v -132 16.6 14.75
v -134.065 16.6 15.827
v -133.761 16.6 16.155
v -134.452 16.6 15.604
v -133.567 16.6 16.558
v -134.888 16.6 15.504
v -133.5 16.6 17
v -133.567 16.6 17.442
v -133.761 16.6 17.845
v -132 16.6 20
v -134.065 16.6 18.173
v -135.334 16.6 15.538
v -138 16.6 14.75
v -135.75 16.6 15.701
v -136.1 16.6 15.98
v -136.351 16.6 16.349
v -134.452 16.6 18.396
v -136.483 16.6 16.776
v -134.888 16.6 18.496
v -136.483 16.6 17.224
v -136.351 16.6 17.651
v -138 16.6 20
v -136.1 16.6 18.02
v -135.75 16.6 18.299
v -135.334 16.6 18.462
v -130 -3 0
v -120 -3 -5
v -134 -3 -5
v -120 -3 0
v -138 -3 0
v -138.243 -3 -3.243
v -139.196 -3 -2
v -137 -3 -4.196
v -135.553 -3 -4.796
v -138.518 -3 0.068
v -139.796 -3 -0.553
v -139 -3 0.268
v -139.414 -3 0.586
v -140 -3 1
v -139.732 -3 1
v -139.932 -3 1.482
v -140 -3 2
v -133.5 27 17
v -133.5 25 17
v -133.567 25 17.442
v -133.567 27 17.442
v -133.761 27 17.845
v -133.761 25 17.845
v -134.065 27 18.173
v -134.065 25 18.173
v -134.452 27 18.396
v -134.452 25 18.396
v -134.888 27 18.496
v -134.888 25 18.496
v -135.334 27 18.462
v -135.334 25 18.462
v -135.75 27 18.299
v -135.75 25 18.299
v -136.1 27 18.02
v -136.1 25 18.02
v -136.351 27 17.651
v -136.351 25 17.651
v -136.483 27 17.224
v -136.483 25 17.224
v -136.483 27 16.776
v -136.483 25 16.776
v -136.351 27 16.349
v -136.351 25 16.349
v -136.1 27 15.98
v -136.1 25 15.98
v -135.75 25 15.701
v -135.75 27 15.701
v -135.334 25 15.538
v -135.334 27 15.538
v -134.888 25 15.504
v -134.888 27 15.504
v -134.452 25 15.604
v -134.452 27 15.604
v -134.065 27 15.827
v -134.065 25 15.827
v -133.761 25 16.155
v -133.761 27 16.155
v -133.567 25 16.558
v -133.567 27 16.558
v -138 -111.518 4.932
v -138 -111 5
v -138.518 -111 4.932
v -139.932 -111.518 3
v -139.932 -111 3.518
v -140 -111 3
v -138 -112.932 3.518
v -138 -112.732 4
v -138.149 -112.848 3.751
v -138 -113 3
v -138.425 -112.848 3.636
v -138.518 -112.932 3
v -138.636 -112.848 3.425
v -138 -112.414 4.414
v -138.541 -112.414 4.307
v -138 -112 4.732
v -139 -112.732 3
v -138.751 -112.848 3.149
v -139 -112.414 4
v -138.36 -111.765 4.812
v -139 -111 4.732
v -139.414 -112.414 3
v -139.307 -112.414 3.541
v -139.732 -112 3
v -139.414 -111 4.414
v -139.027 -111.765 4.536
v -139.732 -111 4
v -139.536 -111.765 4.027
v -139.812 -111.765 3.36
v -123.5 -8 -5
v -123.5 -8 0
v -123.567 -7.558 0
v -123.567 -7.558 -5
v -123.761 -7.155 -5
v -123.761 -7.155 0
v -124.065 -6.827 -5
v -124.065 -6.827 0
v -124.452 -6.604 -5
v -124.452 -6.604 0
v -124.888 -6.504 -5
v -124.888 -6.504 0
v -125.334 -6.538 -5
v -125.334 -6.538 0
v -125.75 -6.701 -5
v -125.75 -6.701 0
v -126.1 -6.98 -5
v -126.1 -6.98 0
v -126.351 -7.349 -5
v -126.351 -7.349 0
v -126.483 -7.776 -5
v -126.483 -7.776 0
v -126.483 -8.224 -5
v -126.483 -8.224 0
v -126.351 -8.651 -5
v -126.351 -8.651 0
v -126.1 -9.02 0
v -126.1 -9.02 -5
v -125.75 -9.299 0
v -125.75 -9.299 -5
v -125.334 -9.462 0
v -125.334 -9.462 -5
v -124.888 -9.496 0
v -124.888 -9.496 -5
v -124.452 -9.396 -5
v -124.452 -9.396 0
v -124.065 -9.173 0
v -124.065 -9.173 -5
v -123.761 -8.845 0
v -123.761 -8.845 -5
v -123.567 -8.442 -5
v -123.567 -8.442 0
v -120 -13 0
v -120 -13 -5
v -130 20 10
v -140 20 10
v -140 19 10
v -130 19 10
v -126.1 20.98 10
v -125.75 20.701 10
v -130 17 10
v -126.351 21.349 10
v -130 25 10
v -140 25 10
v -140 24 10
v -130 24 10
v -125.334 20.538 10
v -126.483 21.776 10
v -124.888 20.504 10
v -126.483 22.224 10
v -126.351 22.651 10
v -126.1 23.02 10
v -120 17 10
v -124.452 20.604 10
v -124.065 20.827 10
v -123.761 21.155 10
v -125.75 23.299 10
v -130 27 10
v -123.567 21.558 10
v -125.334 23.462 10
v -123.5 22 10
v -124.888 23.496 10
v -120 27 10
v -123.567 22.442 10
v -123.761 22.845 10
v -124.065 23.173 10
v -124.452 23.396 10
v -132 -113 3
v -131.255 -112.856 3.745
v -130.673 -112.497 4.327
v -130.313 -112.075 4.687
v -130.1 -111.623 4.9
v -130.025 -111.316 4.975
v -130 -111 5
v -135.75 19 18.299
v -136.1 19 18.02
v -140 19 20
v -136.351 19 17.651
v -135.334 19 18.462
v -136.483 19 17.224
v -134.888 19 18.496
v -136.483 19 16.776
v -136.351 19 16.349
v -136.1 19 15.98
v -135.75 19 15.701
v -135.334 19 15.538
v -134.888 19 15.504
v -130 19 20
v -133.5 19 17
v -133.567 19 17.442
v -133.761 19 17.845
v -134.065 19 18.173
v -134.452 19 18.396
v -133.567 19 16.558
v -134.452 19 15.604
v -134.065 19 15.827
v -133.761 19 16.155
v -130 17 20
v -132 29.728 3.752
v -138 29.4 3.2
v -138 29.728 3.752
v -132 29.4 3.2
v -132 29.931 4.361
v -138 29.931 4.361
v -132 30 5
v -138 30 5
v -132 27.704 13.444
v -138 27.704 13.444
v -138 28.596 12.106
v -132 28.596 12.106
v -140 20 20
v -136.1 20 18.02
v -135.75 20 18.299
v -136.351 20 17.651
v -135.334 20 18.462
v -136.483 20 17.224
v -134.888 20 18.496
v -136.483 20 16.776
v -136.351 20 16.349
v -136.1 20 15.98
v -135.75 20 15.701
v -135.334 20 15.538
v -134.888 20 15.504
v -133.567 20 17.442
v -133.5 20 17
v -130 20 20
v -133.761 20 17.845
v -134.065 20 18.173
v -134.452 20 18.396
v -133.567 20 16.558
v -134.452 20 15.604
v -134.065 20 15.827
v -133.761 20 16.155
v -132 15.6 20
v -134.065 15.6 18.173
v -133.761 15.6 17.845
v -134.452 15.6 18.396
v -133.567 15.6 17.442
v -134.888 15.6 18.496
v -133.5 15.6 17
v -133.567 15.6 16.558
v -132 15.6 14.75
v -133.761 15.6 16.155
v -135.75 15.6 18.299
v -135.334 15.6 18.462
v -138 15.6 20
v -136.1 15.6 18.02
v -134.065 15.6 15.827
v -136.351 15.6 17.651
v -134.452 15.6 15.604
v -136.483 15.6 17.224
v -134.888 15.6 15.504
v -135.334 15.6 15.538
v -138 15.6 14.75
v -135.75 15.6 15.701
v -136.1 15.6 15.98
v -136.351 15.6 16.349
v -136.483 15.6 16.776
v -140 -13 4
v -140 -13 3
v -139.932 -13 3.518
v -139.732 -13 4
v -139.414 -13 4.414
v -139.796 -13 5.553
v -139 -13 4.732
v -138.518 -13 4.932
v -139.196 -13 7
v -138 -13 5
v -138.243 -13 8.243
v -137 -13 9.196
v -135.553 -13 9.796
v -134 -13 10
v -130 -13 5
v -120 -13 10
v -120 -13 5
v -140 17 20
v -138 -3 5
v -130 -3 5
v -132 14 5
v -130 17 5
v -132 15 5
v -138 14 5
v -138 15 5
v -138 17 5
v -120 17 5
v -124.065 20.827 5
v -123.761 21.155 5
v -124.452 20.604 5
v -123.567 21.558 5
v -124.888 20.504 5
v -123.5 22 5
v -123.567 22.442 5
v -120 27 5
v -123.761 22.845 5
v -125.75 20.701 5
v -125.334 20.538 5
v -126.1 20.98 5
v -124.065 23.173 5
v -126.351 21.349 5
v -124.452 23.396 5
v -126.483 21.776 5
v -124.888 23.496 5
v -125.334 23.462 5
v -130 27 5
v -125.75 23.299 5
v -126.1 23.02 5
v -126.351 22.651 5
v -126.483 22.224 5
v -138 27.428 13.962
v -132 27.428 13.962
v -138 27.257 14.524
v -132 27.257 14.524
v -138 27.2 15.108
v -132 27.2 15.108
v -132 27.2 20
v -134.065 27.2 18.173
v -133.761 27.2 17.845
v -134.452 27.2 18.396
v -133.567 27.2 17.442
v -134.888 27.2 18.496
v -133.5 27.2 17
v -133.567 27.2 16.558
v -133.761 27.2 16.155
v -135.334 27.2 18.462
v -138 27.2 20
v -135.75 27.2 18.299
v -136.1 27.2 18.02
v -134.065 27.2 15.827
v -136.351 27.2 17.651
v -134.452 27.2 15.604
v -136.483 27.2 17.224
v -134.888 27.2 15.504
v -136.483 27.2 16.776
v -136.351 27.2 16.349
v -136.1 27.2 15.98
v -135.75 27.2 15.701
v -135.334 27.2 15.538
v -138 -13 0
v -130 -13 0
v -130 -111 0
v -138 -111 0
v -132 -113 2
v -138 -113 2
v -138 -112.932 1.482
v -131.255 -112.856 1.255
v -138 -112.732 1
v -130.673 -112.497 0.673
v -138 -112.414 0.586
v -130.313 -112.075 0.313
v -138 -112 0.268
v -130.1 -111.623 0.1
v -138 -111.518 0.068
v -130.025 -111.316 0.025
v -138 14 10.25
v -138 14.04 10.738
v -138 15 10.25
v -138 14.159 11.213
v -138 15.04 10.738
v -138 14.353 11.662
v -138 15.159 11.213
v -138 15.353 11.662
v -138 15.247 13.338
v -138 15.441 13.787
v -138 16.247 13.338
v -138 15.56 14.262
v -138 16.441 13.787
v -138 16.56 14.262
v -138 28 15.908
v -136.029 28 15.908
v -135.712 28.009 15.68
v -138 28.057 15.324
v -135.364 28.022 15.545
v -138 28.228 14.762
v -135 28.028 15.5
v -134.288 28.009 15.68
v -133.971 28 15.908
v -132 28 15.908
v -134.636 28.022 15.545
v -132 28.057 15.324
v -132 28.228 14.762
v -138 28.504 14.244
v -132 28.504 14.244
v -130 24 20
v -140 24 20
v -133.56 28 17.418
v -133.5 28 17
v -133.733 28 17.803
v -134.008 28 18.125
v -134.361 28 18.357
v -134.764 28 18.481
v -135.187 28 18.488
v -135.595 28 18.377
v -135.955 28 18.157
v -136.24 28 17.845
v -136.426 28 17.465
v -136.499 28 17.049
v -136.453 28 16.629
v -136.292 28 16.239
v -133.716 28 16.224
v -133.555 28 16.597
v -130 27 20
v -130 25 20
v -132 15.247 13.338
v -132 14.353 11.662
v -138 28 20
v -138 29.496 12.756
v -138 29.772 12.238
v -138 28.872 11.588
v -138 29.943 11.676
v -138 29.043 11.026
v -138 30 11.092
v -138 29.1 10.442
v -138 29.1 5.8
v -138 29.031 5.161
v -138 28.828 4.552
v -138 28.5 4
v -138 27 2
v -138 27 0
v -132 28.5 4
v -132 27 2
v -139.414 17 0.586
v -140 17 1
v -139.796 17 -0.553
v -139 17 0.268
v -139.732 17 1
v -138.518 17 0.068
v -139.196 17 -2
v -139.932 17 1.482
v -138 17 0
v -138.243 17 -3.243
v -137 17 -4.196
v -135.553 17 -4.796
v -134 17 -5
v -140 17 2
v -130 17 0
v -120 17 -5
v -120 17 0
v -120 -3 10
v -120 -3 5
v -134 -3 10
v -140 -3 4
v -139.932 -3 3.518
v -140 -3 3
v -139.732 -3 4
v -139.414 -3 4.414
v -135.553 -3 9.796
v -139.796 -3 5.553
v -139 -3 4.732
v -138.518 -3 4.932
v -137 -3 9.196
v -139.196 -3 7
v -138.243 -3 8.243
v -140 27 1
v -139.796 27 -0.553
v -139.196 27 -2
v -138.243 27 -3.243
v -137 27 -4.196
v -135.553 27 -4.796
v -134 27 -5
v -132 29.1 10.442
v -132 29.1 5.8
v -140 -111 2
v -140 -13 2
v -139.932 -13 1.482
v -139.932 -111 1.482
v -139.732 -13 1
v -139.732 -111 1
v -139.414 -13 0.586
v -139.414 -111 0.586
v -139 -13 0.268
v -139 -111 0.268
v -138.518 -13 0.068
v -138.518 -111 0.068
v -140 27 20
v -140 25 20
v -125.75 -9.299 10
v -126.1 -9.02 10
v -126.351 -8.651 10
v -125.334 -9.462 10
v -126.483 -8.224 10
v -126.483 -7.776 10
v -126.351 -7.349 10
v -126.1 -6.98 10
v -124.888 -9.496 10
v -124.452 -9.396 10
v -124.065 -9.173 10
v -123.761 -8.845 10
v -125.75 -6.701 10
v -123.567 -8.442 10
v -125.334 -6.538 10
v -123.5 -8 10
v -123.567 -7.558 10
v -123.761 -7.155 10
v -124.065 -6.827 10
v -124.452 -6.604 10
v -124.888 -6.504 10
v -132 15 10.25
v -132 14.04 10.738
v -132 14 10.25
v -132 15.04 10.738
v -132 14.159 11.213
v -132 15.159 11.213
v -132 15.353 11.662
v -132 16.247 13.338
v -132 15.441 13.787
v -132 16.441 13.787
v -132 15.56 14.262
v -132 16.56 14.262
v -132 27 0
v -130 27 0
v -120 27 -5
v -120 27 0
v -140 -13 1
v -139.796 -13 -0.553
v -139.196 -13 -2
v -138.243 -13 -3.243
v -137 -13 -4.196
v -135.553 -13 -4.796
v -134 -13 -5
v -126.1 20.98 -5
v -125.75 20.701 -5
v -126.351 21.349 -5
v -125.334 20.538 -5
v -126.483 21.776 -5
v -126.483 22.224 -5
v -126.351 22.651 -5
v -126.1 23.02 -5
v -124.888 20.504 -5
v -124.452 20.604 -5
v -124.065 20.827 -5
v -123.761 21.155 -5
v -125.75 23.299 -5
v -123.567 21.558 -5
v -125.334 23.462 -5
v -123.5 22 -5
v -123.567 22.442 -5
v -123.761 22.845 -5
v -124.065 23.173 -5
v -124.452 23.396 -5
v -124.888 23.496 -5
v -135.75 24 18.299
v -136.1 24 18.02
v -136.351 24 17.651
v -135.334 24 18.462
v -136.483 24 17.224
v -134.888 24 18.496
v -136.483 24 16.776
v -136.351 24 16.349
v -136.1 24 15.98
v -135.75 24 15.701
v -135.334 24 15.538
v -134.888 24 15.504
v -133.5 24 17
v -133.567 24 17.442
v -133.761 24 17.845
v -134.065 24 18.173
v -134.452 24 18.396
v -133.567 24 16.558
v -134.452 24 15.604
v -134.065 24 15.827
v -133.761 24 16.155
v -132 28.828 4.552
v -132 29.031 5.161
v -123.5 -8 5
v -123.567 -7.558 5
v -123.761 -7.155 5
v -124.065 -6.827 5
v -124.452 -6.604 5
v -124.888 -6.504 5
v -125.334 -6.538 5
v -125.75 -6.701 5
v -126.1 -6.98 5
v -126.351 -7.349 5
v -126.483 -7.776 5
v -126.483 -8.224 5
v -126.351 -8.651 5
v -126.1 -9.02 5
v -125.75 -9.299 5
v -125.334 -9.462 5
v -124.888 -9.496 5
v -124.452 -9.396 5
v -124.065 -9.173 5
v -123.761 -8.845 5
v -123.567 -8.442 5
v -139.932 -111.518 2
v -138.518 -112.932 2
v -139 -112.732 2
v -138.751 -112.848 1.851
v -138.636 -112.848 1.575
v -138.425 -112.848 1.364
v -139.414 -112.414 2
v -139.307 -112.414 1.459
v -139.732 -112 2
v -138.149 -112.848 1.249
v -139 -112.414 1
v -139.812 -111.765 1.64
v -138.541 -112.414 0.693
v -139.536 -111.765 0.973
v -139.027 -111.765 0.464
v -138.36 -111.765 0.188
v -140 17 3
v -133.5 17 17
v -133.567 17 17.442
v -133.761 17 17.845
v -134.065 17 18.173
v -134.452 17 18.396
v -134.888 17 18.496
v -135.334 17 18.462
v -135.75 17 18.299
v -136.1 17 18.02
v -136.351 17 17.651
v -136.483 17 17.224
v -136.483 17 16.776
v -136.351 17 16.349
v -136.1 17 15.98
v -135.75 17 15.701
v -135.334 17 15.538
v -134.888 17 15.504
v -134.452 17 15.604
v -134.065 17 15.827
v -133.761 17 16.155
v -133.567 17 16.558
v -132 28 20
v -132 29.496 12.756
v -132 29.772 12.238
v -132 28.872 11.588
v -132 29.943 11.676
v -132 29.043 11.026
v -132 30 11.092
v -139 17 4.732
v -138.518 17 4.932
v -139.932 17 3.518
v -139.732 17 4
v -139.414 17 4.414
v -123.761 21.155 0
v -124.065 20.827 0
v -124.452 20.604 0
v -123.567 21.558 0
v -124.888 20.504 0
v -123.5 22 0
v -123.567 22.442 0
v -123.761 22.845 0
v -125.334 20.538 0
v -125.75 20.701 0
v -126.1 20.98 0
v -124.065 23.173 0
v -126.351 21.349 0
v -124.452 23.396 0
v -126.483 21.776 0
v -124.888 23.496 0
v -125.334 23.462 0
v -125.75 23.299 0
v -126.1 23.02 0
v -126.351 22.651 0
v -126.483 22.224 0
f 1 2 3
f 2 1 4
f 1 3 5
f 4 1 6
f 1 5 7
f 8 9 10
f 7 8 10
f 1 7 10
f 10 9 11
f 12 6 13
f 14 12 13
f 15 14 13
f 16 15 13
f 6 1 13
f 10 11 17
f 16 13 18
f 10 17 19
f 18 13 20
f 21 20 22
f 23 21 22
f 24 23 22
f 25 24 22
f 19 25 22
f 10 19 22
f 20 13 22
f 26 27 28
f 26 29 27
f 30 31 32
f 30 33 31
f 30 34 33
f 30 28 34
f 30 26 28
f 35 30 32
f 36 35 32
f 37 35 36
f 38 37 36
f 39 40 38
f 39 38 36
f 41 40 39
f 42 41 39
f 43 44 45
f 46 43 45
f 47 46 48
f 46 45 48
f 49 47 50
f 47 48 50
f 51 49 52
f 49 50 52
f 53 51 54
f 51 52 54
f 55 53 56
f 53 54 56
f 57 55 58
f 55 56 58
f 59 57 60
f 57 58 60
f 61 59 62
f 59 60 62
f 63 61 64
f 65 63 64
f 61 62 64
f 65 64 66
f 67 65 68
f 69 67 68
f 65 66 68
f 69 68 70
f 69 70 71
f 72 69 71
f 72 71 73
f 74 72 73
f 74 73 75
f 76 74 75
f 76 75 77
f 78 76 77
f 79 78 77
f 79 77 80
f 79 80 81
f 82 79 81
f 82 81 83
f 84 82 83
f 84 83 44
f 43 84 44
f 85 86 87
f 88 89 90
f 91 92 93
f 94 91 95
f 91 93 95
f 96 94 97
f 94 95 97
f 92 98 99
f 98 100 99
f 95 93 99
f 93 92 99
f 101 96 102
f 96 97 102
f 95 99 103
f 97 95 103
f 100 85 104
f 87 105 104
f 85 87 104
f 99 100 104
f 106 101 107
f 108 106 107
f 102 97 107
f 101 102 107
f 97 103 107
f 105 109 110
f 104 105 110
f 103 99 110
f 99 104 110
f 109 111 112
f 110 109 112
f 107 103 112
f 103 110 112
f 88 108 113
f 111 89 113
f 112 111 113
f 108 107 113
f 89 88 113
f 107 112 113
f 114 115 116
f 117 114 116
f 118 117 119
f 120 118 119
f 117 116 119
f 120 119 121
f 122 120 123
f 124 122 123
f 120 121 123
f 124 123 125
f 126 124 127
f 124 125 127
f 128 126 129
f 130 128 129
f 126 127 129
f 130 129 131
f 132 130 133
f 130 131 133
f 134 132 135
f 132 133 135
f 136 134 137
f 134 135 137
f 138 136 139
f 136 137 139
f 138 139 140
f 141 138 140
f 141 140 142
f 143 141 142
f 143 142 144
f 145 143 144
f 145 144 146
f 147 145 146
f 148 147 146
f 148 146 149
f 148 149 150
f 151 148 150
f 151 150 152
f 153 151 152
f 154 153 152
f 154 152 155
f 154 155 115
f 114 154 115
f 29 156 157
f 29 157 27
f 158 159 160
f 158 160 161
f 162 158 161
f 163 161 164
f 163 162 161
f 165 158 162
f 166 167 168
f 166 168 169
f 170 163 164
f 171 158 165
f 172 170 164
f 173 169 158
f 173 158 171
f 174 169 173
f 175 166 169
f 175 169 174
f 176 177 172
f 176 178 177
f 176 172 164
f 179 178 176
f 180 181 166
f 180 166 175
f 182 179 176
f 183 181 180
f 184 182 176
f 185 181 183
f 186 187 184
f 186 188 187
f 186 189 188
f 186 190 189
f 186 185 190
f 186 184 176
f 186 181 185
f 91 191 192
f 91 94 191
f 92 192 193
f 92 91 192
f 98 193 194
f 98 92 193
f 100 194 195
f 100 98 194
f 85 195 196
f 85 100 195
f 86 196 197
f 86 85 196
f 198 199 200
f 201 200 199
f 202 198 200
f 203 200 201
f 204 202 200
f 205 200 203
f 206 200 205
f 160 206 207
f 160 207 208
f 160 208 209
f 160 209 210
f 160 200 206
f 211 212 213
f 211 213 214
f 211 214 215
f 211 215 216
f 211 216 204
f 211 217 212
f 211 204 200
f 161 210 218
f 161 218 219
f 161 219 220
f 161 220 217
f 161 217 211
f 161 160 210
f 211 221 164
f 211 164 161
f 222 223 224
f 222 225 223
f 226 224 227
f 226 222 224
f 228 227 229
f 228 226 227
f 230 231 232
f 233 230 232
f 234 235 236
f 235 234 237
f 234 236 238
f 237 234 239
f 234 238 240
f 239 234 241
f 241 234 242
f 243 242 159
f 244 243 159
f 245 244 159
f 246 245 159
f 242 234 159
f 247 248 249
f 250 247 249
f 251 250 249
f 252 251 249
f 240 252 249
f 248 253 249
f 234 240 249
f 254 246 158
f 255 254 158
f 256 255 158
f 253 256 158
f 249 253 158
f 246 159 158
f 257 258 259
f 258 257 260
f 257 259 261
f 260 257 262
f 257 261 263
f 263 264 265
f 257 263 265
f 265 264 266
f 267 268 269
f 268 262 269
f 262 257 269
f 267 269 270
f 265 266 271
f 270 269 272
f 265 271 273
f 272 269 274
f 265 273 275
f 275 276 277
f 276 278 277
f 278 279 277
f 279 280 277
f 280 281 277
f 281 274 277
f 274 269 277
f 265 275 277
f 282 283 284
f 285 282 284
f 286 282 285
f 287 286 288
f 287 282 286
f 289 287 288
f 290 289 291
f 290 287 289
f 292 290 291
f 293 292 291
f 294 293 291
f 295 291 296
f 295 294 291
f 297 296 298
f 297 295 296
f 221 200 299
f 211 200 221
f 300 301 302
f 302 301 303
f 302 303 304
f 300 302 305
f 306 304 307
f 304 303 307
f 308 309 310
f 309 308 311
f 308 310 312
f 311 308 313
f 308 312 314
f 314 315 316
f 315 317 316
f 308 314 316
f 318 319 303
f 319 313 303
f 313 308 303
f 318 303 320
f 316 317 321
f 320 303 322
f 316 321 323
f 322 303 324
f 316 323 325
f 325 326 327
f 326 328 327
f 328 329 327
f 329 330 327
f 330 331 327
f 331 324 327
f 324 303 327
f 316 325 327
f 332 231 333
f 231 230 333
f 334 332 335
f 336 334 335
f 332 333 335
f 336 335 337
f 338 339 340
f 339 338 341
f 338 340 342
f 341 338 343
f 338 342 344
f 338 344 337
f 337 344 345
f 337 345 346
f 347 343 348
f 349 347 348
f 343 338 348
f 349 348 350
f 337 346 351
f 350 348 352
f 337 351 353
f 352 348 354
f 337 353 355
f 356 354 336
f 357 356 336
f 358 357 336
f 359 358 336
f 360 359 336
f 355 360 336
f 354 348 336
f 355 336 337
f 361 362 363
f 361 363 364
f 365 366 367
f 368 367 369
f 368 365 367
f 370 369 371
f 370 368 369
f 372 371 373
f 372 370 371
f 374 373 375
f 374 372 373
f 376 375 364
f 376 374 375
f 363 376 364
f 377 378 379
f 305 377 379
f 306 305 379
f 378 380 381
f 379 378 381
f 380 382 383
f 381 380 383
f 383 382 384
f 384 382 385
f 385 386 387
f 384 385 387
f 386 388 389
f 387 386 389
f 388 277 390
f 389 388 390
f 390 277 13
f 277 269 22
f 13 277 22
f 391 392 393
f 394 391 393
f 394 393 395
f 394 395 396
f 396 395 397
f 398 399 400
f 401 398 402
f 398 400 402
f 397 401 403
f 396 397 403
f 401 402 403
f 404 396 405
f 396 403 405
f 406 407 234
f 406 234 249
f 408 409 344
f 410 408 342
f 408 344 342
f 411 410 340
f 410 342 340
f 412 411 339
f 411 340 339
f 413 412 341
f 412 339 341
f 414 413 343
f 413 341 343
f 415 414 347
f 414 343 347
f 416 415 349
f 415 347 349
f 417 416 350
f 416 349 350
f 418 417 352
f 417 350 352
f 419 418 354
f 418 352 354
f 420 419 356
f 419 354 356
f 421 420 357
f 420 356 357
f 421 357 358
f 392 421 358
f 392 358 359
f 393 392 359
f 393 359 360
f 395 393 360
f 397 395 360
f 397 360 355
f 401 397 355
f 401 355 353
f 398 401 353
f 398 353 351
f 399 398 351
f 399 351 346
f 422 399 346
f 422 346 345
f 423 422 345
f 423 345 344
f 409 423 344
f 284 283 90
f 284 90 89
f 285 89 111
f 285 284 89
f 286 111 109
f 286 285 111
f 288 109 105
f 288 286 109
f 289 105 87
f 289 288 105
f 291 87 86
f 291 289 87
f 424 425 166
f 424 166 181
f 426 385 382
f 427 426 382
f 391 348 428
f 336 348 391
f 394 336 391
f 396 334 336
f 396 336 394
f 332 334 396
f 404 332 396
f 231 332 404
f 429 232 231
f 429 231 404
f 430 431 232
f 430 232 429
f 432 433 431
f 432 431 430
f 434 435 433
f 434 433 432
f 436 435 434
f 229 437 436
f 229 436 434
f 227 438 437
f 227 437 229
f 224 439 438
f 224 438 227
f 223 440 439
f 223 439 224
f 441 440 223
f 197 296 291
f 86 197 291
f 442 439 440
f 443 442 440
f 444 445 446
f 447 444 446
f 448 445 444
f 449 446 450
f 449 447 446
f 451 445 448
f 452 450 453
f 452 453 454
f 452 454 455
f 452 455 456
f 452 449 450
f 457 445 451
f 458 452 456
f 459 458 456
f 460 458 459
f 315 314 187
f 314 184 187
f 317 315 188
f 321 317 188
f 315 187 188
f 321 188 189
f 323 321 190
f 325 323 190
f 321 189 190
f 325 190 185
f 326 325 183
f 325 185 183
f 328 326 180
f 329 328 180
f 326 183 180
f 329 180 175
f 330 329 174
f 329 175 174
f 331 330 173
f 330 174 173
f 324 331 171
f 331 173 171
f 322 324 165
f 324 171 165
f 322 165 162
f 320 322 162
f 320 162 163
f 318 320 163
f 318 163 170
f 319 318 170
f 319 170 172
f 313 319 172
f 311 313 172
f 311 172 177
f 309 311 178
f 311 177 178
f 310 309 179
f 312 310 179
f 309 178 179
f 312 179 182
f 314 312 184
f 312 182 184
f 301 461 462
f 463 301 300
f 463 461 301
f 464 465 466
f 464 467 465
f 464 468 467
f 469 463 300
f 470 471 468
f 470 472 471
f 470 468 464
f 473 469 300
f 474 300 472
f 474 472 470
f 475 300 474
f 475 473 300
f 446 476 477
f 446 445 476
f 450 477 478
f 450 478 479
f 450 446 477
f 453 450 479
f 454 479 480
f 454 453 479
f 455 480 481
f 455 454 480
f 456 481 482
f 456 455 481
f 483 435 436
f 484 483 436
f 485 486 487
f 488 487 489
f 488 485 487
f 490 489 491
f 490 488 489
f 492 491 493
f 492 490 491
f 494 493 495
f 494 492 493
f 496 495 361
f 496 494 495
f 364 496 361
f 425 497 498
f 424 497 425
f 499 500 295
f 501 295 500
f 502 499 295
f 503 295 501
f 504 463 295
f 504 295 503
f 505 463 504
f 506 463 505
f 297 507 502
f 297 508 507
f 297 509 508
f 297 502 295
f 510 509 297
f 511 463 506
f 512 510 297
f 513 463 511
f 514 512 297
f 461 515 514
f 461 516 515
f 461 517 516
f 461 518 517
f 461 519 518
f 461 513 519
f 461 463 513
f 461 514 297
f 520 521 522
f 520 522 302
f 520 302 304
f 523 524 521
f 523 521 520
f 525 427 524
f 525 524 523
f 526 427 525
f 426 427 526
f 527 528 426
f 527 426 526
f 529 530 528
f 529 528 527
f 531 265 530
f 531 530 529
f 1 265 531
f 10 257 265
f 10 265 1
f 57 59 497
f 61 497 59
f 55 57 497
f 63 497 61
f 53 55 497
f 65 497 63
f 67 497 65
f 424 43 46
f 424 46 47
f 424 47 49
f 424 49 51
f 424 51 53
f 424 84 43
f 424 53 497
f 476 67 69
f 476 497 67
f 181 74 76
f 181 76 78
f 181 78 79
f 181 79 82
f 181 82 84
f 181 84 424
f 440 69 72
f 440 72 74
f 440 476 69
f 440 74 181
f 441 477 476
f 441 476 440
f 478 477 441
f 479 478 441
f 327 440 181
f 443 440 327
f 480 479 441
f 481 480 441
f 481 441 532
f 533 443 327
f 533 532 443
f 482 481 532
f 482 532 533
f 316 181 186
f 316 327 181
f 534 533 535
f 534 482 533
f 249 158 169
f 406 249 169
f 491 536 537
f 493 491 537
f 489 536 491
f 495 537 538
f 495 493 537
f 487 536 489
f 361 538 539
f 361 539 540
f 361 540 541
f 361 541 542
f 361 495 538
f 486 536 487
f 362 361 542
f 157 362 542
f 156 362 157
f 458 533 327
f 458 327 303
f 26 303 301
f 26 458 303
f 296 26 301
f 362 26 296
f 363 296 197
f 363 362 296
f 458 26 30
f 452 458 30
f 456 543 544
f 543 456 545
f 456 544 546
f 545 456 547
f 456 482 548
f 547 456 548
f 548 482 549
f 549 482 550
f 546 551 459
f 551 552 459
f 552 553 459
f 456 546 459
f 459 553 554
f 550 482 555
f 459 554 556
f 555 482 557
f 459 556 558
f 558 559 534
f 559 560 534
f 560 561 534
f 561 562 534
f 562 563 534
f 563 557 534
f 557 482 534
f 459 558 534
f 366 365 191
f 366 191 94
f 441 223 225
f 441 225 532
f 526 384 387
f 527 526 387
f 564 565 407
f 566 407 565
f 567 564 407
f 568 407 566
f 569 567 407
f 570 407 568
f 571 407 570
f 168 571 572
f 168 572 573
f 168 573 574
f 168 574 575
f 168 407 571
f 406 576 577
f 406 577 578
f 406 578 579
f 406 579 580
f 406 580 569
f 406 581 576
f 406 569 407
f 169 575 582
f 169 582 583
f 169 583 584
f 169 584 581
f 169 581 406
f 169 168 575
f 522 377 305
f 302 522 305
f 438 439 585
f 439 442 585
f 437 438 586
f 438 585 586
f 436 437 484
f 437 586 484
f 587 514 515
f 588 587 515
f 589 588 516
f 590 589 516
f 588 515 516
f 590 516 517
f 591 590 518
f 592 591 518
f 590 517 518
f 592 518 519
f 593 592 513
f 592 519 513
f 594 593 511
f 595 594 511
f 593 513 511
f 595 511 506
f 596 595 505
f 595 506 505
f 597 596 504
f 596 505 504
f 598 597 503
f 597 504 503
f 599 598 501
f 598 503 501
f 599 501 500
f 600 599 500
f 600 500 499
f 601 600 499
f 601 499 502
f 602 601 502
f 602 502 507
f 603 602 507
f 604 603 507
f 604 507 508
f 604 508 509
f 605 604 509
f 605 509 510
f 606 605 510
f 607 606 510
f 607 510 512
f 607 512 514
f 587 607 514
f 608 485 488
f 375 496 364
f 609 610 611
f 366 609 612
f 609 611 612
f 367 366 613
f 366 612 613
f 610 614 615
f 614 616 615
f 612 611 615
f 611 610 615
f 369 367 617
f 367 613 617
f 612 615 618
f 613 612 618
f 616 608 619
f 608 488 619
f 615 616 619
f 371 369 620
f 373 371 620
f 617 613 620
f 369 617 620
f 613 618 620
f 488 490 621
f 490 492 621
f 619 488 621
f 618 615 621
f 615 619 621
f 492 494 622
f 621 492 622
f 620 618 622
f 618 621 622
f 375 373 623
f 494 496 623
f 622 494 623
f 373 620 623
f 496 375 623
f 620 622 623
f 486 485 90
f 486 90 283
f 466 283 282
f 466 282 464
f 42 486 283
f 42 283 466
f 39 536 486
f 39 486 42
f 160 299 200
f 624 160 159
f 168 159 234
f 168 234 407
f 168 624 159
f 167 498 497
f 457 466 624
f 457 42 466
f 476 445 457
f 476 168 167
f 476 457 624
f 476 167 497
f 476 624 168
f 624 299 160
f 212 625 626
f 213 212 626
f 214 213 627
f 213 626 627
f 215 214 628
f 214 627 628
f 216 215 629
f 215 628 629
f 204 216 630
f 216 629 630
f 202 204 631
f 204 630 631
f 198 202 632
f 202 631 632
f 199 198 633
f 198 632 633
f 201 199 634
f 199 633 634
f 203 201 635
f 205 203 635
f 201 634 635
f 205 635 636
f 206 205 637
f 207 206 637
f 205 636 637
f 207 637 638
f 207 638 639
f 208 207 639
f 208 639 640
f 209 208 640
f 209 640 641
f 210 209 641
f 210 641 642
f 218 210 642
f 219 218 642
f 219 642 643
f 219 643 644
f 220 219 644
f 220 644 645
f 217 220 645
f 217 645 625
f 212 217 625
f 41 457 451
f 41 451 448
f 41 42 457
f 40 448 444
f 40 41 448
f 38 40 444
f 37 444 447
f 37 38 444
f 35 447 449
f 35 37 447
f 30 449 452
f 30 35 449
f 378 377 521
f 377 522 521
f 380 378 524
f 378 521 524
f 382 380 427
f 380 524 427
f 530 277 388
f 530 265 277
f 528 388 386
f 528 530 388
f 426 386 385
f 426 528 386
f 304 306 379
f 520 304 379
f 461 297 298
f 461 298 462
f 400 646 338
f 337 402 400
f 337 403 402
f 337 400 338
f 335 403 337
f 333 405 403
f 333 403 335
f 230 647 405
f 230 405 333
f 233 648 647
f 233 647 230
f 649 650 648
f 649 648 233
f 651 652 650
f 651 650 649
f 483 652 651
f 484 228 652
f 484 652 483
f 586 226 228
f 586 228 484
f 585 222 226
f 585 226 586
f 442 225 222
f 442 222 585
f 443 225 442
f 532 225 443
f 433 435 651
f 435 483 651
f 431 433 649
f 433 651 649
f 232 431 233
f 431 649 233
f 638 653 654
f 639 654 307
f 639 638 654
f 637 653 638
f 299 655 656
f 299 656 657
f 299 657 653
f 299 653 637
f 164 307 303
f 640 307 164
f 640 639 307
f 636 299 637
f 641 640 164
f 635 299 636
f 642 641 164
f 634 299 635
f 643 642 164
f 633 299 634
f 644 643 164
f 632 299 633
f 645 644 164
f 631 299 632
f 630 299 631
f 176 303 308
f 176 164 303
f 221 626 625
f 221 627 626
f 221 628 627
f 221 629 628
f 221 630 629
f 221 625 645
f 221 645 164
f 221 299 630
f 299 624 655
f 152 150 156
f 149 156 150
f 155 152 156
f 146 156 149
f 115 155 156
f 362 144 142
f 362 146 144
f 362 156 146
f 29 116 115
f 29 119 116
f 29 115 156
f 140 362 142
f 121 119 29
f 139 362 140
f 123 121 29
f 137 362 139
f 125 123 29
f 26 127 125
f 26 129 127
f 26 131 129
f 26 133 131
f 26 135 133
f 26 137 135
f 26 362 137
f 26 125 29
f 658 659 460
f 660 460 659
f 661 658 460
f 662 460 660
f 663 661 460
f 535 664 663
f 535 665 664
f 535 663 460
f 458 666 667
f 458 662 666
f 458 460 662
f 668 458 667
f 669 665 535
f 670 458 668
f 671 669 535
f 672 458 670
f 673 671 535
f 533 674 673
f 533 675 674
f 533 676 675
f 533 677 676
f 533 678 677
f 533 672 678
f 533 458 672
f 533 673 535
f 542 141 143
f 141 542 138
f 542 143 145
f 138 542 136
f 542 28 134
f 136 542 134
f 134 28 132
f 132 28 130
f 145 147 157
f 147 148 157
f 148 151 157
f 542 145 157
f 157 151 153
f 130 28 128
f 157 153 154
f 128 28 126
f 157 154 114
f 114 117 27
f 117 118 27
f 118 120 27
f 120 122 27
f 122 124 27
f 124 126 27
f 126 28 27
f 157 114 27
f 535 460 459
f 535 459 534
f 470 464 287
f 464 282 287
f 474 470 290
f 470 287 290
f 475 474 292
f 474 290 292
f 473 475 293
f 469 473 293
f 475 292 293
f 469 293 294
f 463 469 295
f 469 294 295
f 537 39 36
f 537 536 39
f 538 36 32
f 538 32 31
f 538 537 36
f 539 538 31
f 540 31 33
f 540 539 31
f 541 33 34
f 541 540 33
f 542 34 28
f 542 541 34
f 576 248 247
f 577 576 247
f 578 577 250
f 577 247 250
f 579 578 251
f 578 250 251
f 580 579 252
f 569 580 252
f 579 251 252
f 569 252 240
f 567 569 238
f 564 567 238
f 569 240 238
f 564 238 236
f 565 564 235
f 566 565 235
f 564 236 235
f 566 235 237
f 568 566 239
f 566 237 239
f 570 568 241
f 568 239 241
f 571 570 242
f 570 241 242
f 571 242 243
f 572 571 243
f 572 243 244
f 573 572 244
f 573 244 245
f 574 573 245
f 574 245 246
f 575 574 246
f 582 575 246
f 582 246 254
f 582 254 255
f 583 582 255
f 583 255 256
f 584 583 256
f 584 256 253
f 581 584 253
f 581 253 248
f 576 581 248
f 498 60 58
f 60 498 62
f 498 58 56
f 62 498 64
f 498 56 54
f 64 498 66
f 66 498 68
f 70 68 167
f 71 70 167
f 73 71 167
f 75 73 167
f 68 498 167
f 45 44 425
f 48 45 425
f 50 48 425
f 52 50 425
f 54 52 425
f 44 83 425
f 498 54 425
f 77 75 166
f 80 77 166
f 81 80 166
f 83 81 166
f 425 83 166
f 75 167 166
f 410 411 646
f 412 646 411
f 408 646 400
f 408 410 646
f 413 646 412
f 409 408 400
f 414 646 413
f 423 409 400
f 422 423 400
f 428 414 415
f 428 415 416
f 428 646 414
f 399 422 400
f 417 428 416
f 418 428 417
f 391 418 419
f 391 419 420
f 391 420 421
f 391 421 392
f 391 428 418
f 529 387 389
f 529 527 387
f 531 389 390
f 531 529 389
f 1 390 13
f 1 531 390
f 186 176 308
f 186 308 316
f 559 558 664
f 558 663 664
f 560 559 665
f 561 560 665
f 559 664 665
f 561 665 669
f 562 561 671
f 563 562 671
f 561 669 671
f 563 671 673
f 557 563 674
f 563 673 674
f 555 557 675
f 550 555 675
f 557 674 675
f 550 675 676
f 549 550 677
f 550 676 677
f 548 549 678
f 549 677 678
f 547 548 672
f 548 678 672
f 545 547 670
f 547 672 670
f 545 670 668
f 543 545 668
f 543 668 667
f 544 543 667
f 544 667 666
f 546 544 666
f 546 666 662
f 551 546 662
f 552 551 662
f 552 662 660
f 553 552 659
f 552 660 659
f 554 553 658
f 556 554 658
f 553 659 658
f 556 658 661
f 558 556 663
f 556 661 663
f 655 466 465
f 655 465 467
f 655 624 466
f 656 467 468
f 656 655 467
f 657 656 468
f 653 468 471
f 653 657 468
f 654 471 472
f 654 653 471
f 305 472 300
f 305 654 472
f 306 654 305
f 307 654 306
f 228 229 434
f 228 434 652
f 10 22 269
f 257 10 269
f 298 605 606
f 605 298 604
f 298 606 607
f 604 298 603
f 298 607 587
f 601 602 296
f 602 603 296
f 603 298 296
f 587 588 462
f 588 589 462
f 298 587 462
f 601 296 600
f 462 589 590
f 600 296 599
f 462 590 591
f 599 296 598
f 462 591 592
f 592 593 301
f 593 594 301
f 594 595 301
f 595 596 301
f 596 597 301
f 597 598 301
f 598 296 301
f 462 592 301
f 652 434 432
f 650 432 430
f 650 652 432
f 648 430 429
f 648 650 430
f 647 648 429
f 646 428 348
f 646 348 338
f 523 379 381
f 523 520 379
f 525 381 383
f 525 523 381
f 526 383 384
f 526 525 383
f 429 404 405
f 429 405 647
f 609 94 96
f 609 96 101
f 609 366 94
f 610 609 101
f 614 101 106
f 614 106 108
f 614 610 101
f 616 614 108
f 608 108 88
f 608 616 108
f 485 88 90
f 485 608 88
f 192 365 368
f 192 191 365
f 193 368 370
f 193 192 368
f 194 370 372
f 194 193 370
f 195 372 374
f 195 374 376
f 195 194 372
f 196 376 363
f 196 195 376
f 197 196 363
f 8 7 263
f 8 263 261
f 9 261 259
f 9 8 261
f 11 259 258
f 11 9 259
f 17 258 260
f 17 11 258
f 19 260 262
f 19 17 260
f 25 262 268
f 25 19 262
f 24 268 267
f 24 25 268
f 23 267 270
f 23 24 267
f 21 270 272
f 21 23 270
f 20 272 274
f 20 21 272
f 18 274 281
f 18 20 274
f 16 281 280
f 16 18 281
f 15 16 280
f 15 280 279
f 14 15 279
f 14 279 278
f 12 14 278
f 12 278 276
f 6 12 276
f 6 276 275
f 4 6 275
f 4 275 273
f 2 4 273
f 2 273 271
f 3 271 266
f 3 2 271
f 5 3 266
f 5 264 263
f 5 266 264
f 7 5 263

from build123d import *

# Parameters (mm, degrees)
PAD008_DEPTH         = 5
PAD009_DEPTH         = 10
PAD009_DEPTH_BACK    = 5
SKETCH045_W          = 10
SKETCH045_H          = 5
POCKET004_DEPTH      = 11
SKETCH044_R          = 1.5
POCKET005_DEPTH      = 10
PAD010_DEPTH         = 10
PAD010_DEPTH_BACK    = 5
SKETCH042_W          = 10
SKETCH042_H          = 5
POCKET006_DEPTH      = 10
SKETCH041_R          = 1.5
POCKET007_DEPTH      = 15
FILLET_R             = 2
FILLET001_R          = 6
FILLET002_R          = 2
SKETCH039_W          = 10
SKETCH039_H          = 2
SKETCH039_H_2        = 4
PAD021_DEPTH         = 10
PAD022_DEPTH         = 20
POCKET018_DEPTH      = 8
PAD025_DEPTH         = 6
FILLET003_R          = 3
SKETCH040_R          = 1.5
POCKET023_DEPTH      = 15
POCKET023_DEPTH_BACK = 6


with BuildPart() as part:
    # Sketch047 → Pad008 (new body)
    with BuildSketch(Plane.XY):
        Polygon((0, 0), (5, 0), (5, -140), (-5, -140), (-5, 0), align=None)
    extrude(amount=PAD008_DEPTH)

    # Sketch046 → Pad009 (join, two sides)
    with BuildSketch(Plane.XY) as pad009_sk:
        Polygon((0, 0), (-5, 0), (-5, -10), (15, -10), (15, 0), align=None)
    extrude(amount=PAD009_DEPTH)
    extrude(pad009_sk.sketch, amount=-PAD009_DEPTH_BACK)

    # Sketch045 → Pocket004 (cut)
    with BuildSketch(Plane.YZ.offset(5)):
        with Locations((-5, 2.5)):
            Rectangle(SKETCH045_W, SKETCH045_H)
    extrude(amount=POCKET004_DEPTH, mode=Mode.SUBTRACT)

    # Sketch044 → Pocket005 (cut, symmetric)
    with BuildSketch(Plane(origin=(10, -5, 0), x_dir=(1, 0, 0), z_dir=(0, 0, 1))):
        Circle(SKETCH044_R)
    extrude(amount=POCKET005_DEPTH, both=True, mode=Mode.SUBTRACT)

    # Sketch043 → Pad010 (join, two sides)
    with BuildSketch(Plane.XY) as pad010_sk:
        Polygon((0, -30), (-5, -30), (-5, -40), (15, -40), (15, -30), align=None)
    extrude(amount=PAD010_DEPTH)
    extrude(pad010_sk.sketch, amount=-PAD010_DEPTH_BACK)

    # Sketch042 → Pocket006 (cut)
    with BuildSketch(Plane.YZ.offset(5)):
        with Locations((-35, 2.5)):
            Rectangle(SKETCH042_W, SKETCH042_H)
    extrude(amount=POCKET006_DEPTH, mode=Mode.SUBTRACT)

    # Sketch041 → Pocket007 (cut)
    with BuildSketch(Plane(origin=(10, -35, 10), x_dir=(1, 0, 0), z_dir=(0, 0, 1))):
        Circle(SKETCH041_R)
    extrude(amount=-POCKET007_DEPTH, mode=Mode.SUBTRACT)

    # Fillet
    fillet_edges = [part.edges().sort_by_distance(p)[0] for p in [
        (-5, -20, 5),
        (-5, -90, 5),
        (-5, -90, 0),
        (-5, -20, 0),
    ]]
    fillet(fillet_edges, radius=FILLET_R)

    # Fillet001
    fillet001_edges = [part.edges().sort_by_distance(p)[0] for p in [
        (-5, -35, -5),
        (-5, -35, 10),
        (-5, -5, -5),
    ]]
    fillet(fillet001_edges, radius=FILLET001_R)

    # Fillet002
    fillet002_edges = [part.edges().sort_by_distance(p)[0] for p in [
        (5, -140, 2.5),
        (1, -140, 5),
        (-4.414214, -140, 4.414214),
        (-4.414214, -140, 0.585786),
        (1, -140, 0),
        (-5, -140, 2.5),
    ]]
    fillet(fillet002_edges, radius=FILLET002_R)

    # Sketch039 → Pad021 (join)
    with BuildSketch(Plane(origin=(-5, 0, 10), x_dir=(1, 0, 0), z_dir=(0, 0, 1))):
        with Locations((5, -1)):
            Rectangle(SKETCH039_W, SKETCH039_H)
        with Locations((5, -5)):
            Rectangle(SKETCH039_W, SKETCH039_H_2)
        with Locations((5, -9)):
            Rectangle(SKETCH039_W, SKETCH039_H)
    extrude(amount=PAD021_DEPTH)

    # Sketch048 → Pad022 (join)
    with BuildSketch(Plane.XY):
        Polygon((0, 0), (-3, 0), (-3, 3), (3, 3), (3, 0), align=None)
    extrude(amount=PAD022_DEPTH)

    # Sketch049 → Pocket018 (cut)
    with BuildSketch(Plane.YZ.offset(-3)):
        Polygon((0, 0), (3, 0), (3, 4), align=None)
        Polygon((3, 20), (1, 20), (1, 15), (3, 12), align=None)
        Polygon((0, 20), (0.2, 20), (0.2, 14.2), (2.1, 11.35), (2.1, 4.8), (0, 2), (0, 14.5), align=None)
    extrude(amount=POCKET018_DEPTH, mode=Mode.SUBTRACT)

    # Sketch054 → Pad025 (join)
    with BuildSketch(Plane(origin=(-3, -12, 5), x_dir=(0, 1, 0), z_dir=(1, 0, 0))):
        Polygon((0, 0), (0, 6), (1.6, 9), (1.6, 15), (0.6, 15), (0.6, 9), (-1, 6), (-1, 0), align=None)
    extrude(amount=PAD025_DEPTH)

    # Fillet003
    fillet003_edges = [part.edges().sort_by_distance(p)[0] for p in [
        (0, -12, 11),
        (0, -10.4, 14),
        (0, -13, 11),
        (0, -11.4, 14),
        (0, 2.1, 11.35),
        (0, 3, 4),
        (0, 3, 12),
        (0, 1, 15),
        (0, 0.2, 14.2),
        (0, 2.1, 4.8),
    ]]
    fillet(fillet003_edges, radius=FILLET003_R)

    # Sketch040 → Pocket023 (cut, two sides)
    with BuildSketch(Plane(origin=(0, -10, 17), x_dir=(1, 0, 0), z_dir=(0, -1, 0))) as pocket023_sk:
        Circle(SKETCH040_R)
    extrude(amount=-POCKET023_DEPTH, mode=Mode.SUBTRACT)
    extrude(pocket023_sk.sketch, amount=POCKET023_DEPTH_BACK, mode=Mode.SUBTRACT)


with BuildPart() as part_1:
    # Body007 placement: moved
    add(part.part.moved(Location((-135, 27, 0))))


solid = part_1.part
